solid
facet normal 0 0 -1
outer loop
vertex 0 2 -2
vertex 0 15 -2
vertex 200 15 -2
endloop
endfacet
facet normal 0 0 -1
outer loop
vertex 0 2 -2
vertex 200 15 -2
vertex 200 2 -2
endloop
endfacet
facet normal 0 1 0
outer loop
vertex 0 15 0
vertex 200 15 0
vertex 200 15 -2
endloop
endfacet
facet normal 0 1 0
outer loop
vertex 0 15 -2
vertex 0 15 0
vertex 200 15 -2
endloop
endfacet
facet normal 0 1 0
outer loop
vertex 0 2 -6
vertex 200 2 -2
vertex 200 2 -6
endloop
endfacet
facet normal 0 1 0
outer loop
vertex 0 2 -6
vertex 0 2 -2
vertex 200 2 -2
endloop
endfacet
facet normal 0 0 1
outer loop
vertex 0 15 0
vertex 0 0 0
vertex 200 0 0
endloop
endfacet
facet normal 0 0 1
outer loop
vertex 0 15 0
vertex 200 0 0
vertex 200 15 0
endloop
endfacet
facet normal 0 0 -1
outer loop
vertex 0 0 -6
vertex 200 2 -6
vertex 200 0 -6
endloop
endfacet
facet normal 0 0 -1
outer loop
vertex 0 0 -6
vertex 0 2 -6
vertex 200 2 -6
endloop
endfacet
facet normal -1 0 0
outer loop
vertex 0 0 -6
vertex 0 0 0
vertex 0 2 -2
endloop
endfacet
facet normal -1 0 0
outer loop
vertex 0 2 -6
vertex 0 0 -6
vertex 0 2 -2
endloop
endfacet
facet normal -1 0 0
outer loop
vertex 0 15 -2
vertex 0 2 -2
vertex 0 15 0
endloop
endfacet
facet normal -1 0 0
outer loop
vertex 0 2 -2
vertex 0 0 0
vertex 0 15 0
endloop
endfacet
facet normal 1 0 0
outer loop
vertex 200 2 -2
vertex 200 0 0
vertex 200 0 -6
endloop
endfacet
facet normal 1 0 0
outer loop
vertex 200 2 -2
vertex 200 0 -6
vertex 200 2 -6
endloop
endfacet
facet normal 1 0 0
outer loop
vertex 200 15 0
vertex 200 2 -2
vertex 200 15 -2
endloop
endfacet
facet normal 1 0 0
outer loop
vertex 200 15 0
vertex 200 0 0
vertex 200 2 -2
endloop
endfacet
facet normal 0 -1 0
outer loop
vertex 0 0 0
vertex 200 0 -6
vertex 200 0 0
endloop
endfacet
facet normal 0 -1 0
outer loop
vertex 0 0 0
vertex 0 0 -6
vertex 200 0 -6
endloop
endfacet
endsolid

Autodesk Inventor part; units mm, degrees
ref_plane "YZ Plane" through (0, 0, 0) normal (1, 0, 0) x (0, 1, 0)
ref_plane "XZ Plane" through (0, 0, 0) normal (0, 1, 0) x (-1, 0, 0)
ref_plane "XY Plane" through (0, 0, 0) normal (0, 0, 1) x (1, 0, 0)
sketch "Sketch1" plane through (0, 0, 0) normal (1, 0, 0) x (0, 1, 0)
  line L0 (0, 0) -> (15, 0)
  line L1 (15, 0) -> (15, -2)
  line L2 (15, -2) -> (0, -2)
  line L3 (0, -2) -> (0, 0)
  line L4 (0, 0) -> (2, 0)
  line L5 (2, 0) -> (2, -6)
  line L6 (2, -6) -> (0, -6)
  line L7 (0, -6) -> (0, 0)
  point P0 (0, -1)
  point P1 (1, 0)
  point P2 (1, -6)
  point P3 (2, -2)
  point P4 (0, -2)
  dimension "d0" = 15
  dimension "d1" = 2
  dimension "d2" = 2
  dimension "d3" = 6
extrude "Extrusion1" add sketch "Sketch1" along normal blind 200
equation "\"d2\" = d1"
properties part number "GuiderailRS3" material "Steel"
